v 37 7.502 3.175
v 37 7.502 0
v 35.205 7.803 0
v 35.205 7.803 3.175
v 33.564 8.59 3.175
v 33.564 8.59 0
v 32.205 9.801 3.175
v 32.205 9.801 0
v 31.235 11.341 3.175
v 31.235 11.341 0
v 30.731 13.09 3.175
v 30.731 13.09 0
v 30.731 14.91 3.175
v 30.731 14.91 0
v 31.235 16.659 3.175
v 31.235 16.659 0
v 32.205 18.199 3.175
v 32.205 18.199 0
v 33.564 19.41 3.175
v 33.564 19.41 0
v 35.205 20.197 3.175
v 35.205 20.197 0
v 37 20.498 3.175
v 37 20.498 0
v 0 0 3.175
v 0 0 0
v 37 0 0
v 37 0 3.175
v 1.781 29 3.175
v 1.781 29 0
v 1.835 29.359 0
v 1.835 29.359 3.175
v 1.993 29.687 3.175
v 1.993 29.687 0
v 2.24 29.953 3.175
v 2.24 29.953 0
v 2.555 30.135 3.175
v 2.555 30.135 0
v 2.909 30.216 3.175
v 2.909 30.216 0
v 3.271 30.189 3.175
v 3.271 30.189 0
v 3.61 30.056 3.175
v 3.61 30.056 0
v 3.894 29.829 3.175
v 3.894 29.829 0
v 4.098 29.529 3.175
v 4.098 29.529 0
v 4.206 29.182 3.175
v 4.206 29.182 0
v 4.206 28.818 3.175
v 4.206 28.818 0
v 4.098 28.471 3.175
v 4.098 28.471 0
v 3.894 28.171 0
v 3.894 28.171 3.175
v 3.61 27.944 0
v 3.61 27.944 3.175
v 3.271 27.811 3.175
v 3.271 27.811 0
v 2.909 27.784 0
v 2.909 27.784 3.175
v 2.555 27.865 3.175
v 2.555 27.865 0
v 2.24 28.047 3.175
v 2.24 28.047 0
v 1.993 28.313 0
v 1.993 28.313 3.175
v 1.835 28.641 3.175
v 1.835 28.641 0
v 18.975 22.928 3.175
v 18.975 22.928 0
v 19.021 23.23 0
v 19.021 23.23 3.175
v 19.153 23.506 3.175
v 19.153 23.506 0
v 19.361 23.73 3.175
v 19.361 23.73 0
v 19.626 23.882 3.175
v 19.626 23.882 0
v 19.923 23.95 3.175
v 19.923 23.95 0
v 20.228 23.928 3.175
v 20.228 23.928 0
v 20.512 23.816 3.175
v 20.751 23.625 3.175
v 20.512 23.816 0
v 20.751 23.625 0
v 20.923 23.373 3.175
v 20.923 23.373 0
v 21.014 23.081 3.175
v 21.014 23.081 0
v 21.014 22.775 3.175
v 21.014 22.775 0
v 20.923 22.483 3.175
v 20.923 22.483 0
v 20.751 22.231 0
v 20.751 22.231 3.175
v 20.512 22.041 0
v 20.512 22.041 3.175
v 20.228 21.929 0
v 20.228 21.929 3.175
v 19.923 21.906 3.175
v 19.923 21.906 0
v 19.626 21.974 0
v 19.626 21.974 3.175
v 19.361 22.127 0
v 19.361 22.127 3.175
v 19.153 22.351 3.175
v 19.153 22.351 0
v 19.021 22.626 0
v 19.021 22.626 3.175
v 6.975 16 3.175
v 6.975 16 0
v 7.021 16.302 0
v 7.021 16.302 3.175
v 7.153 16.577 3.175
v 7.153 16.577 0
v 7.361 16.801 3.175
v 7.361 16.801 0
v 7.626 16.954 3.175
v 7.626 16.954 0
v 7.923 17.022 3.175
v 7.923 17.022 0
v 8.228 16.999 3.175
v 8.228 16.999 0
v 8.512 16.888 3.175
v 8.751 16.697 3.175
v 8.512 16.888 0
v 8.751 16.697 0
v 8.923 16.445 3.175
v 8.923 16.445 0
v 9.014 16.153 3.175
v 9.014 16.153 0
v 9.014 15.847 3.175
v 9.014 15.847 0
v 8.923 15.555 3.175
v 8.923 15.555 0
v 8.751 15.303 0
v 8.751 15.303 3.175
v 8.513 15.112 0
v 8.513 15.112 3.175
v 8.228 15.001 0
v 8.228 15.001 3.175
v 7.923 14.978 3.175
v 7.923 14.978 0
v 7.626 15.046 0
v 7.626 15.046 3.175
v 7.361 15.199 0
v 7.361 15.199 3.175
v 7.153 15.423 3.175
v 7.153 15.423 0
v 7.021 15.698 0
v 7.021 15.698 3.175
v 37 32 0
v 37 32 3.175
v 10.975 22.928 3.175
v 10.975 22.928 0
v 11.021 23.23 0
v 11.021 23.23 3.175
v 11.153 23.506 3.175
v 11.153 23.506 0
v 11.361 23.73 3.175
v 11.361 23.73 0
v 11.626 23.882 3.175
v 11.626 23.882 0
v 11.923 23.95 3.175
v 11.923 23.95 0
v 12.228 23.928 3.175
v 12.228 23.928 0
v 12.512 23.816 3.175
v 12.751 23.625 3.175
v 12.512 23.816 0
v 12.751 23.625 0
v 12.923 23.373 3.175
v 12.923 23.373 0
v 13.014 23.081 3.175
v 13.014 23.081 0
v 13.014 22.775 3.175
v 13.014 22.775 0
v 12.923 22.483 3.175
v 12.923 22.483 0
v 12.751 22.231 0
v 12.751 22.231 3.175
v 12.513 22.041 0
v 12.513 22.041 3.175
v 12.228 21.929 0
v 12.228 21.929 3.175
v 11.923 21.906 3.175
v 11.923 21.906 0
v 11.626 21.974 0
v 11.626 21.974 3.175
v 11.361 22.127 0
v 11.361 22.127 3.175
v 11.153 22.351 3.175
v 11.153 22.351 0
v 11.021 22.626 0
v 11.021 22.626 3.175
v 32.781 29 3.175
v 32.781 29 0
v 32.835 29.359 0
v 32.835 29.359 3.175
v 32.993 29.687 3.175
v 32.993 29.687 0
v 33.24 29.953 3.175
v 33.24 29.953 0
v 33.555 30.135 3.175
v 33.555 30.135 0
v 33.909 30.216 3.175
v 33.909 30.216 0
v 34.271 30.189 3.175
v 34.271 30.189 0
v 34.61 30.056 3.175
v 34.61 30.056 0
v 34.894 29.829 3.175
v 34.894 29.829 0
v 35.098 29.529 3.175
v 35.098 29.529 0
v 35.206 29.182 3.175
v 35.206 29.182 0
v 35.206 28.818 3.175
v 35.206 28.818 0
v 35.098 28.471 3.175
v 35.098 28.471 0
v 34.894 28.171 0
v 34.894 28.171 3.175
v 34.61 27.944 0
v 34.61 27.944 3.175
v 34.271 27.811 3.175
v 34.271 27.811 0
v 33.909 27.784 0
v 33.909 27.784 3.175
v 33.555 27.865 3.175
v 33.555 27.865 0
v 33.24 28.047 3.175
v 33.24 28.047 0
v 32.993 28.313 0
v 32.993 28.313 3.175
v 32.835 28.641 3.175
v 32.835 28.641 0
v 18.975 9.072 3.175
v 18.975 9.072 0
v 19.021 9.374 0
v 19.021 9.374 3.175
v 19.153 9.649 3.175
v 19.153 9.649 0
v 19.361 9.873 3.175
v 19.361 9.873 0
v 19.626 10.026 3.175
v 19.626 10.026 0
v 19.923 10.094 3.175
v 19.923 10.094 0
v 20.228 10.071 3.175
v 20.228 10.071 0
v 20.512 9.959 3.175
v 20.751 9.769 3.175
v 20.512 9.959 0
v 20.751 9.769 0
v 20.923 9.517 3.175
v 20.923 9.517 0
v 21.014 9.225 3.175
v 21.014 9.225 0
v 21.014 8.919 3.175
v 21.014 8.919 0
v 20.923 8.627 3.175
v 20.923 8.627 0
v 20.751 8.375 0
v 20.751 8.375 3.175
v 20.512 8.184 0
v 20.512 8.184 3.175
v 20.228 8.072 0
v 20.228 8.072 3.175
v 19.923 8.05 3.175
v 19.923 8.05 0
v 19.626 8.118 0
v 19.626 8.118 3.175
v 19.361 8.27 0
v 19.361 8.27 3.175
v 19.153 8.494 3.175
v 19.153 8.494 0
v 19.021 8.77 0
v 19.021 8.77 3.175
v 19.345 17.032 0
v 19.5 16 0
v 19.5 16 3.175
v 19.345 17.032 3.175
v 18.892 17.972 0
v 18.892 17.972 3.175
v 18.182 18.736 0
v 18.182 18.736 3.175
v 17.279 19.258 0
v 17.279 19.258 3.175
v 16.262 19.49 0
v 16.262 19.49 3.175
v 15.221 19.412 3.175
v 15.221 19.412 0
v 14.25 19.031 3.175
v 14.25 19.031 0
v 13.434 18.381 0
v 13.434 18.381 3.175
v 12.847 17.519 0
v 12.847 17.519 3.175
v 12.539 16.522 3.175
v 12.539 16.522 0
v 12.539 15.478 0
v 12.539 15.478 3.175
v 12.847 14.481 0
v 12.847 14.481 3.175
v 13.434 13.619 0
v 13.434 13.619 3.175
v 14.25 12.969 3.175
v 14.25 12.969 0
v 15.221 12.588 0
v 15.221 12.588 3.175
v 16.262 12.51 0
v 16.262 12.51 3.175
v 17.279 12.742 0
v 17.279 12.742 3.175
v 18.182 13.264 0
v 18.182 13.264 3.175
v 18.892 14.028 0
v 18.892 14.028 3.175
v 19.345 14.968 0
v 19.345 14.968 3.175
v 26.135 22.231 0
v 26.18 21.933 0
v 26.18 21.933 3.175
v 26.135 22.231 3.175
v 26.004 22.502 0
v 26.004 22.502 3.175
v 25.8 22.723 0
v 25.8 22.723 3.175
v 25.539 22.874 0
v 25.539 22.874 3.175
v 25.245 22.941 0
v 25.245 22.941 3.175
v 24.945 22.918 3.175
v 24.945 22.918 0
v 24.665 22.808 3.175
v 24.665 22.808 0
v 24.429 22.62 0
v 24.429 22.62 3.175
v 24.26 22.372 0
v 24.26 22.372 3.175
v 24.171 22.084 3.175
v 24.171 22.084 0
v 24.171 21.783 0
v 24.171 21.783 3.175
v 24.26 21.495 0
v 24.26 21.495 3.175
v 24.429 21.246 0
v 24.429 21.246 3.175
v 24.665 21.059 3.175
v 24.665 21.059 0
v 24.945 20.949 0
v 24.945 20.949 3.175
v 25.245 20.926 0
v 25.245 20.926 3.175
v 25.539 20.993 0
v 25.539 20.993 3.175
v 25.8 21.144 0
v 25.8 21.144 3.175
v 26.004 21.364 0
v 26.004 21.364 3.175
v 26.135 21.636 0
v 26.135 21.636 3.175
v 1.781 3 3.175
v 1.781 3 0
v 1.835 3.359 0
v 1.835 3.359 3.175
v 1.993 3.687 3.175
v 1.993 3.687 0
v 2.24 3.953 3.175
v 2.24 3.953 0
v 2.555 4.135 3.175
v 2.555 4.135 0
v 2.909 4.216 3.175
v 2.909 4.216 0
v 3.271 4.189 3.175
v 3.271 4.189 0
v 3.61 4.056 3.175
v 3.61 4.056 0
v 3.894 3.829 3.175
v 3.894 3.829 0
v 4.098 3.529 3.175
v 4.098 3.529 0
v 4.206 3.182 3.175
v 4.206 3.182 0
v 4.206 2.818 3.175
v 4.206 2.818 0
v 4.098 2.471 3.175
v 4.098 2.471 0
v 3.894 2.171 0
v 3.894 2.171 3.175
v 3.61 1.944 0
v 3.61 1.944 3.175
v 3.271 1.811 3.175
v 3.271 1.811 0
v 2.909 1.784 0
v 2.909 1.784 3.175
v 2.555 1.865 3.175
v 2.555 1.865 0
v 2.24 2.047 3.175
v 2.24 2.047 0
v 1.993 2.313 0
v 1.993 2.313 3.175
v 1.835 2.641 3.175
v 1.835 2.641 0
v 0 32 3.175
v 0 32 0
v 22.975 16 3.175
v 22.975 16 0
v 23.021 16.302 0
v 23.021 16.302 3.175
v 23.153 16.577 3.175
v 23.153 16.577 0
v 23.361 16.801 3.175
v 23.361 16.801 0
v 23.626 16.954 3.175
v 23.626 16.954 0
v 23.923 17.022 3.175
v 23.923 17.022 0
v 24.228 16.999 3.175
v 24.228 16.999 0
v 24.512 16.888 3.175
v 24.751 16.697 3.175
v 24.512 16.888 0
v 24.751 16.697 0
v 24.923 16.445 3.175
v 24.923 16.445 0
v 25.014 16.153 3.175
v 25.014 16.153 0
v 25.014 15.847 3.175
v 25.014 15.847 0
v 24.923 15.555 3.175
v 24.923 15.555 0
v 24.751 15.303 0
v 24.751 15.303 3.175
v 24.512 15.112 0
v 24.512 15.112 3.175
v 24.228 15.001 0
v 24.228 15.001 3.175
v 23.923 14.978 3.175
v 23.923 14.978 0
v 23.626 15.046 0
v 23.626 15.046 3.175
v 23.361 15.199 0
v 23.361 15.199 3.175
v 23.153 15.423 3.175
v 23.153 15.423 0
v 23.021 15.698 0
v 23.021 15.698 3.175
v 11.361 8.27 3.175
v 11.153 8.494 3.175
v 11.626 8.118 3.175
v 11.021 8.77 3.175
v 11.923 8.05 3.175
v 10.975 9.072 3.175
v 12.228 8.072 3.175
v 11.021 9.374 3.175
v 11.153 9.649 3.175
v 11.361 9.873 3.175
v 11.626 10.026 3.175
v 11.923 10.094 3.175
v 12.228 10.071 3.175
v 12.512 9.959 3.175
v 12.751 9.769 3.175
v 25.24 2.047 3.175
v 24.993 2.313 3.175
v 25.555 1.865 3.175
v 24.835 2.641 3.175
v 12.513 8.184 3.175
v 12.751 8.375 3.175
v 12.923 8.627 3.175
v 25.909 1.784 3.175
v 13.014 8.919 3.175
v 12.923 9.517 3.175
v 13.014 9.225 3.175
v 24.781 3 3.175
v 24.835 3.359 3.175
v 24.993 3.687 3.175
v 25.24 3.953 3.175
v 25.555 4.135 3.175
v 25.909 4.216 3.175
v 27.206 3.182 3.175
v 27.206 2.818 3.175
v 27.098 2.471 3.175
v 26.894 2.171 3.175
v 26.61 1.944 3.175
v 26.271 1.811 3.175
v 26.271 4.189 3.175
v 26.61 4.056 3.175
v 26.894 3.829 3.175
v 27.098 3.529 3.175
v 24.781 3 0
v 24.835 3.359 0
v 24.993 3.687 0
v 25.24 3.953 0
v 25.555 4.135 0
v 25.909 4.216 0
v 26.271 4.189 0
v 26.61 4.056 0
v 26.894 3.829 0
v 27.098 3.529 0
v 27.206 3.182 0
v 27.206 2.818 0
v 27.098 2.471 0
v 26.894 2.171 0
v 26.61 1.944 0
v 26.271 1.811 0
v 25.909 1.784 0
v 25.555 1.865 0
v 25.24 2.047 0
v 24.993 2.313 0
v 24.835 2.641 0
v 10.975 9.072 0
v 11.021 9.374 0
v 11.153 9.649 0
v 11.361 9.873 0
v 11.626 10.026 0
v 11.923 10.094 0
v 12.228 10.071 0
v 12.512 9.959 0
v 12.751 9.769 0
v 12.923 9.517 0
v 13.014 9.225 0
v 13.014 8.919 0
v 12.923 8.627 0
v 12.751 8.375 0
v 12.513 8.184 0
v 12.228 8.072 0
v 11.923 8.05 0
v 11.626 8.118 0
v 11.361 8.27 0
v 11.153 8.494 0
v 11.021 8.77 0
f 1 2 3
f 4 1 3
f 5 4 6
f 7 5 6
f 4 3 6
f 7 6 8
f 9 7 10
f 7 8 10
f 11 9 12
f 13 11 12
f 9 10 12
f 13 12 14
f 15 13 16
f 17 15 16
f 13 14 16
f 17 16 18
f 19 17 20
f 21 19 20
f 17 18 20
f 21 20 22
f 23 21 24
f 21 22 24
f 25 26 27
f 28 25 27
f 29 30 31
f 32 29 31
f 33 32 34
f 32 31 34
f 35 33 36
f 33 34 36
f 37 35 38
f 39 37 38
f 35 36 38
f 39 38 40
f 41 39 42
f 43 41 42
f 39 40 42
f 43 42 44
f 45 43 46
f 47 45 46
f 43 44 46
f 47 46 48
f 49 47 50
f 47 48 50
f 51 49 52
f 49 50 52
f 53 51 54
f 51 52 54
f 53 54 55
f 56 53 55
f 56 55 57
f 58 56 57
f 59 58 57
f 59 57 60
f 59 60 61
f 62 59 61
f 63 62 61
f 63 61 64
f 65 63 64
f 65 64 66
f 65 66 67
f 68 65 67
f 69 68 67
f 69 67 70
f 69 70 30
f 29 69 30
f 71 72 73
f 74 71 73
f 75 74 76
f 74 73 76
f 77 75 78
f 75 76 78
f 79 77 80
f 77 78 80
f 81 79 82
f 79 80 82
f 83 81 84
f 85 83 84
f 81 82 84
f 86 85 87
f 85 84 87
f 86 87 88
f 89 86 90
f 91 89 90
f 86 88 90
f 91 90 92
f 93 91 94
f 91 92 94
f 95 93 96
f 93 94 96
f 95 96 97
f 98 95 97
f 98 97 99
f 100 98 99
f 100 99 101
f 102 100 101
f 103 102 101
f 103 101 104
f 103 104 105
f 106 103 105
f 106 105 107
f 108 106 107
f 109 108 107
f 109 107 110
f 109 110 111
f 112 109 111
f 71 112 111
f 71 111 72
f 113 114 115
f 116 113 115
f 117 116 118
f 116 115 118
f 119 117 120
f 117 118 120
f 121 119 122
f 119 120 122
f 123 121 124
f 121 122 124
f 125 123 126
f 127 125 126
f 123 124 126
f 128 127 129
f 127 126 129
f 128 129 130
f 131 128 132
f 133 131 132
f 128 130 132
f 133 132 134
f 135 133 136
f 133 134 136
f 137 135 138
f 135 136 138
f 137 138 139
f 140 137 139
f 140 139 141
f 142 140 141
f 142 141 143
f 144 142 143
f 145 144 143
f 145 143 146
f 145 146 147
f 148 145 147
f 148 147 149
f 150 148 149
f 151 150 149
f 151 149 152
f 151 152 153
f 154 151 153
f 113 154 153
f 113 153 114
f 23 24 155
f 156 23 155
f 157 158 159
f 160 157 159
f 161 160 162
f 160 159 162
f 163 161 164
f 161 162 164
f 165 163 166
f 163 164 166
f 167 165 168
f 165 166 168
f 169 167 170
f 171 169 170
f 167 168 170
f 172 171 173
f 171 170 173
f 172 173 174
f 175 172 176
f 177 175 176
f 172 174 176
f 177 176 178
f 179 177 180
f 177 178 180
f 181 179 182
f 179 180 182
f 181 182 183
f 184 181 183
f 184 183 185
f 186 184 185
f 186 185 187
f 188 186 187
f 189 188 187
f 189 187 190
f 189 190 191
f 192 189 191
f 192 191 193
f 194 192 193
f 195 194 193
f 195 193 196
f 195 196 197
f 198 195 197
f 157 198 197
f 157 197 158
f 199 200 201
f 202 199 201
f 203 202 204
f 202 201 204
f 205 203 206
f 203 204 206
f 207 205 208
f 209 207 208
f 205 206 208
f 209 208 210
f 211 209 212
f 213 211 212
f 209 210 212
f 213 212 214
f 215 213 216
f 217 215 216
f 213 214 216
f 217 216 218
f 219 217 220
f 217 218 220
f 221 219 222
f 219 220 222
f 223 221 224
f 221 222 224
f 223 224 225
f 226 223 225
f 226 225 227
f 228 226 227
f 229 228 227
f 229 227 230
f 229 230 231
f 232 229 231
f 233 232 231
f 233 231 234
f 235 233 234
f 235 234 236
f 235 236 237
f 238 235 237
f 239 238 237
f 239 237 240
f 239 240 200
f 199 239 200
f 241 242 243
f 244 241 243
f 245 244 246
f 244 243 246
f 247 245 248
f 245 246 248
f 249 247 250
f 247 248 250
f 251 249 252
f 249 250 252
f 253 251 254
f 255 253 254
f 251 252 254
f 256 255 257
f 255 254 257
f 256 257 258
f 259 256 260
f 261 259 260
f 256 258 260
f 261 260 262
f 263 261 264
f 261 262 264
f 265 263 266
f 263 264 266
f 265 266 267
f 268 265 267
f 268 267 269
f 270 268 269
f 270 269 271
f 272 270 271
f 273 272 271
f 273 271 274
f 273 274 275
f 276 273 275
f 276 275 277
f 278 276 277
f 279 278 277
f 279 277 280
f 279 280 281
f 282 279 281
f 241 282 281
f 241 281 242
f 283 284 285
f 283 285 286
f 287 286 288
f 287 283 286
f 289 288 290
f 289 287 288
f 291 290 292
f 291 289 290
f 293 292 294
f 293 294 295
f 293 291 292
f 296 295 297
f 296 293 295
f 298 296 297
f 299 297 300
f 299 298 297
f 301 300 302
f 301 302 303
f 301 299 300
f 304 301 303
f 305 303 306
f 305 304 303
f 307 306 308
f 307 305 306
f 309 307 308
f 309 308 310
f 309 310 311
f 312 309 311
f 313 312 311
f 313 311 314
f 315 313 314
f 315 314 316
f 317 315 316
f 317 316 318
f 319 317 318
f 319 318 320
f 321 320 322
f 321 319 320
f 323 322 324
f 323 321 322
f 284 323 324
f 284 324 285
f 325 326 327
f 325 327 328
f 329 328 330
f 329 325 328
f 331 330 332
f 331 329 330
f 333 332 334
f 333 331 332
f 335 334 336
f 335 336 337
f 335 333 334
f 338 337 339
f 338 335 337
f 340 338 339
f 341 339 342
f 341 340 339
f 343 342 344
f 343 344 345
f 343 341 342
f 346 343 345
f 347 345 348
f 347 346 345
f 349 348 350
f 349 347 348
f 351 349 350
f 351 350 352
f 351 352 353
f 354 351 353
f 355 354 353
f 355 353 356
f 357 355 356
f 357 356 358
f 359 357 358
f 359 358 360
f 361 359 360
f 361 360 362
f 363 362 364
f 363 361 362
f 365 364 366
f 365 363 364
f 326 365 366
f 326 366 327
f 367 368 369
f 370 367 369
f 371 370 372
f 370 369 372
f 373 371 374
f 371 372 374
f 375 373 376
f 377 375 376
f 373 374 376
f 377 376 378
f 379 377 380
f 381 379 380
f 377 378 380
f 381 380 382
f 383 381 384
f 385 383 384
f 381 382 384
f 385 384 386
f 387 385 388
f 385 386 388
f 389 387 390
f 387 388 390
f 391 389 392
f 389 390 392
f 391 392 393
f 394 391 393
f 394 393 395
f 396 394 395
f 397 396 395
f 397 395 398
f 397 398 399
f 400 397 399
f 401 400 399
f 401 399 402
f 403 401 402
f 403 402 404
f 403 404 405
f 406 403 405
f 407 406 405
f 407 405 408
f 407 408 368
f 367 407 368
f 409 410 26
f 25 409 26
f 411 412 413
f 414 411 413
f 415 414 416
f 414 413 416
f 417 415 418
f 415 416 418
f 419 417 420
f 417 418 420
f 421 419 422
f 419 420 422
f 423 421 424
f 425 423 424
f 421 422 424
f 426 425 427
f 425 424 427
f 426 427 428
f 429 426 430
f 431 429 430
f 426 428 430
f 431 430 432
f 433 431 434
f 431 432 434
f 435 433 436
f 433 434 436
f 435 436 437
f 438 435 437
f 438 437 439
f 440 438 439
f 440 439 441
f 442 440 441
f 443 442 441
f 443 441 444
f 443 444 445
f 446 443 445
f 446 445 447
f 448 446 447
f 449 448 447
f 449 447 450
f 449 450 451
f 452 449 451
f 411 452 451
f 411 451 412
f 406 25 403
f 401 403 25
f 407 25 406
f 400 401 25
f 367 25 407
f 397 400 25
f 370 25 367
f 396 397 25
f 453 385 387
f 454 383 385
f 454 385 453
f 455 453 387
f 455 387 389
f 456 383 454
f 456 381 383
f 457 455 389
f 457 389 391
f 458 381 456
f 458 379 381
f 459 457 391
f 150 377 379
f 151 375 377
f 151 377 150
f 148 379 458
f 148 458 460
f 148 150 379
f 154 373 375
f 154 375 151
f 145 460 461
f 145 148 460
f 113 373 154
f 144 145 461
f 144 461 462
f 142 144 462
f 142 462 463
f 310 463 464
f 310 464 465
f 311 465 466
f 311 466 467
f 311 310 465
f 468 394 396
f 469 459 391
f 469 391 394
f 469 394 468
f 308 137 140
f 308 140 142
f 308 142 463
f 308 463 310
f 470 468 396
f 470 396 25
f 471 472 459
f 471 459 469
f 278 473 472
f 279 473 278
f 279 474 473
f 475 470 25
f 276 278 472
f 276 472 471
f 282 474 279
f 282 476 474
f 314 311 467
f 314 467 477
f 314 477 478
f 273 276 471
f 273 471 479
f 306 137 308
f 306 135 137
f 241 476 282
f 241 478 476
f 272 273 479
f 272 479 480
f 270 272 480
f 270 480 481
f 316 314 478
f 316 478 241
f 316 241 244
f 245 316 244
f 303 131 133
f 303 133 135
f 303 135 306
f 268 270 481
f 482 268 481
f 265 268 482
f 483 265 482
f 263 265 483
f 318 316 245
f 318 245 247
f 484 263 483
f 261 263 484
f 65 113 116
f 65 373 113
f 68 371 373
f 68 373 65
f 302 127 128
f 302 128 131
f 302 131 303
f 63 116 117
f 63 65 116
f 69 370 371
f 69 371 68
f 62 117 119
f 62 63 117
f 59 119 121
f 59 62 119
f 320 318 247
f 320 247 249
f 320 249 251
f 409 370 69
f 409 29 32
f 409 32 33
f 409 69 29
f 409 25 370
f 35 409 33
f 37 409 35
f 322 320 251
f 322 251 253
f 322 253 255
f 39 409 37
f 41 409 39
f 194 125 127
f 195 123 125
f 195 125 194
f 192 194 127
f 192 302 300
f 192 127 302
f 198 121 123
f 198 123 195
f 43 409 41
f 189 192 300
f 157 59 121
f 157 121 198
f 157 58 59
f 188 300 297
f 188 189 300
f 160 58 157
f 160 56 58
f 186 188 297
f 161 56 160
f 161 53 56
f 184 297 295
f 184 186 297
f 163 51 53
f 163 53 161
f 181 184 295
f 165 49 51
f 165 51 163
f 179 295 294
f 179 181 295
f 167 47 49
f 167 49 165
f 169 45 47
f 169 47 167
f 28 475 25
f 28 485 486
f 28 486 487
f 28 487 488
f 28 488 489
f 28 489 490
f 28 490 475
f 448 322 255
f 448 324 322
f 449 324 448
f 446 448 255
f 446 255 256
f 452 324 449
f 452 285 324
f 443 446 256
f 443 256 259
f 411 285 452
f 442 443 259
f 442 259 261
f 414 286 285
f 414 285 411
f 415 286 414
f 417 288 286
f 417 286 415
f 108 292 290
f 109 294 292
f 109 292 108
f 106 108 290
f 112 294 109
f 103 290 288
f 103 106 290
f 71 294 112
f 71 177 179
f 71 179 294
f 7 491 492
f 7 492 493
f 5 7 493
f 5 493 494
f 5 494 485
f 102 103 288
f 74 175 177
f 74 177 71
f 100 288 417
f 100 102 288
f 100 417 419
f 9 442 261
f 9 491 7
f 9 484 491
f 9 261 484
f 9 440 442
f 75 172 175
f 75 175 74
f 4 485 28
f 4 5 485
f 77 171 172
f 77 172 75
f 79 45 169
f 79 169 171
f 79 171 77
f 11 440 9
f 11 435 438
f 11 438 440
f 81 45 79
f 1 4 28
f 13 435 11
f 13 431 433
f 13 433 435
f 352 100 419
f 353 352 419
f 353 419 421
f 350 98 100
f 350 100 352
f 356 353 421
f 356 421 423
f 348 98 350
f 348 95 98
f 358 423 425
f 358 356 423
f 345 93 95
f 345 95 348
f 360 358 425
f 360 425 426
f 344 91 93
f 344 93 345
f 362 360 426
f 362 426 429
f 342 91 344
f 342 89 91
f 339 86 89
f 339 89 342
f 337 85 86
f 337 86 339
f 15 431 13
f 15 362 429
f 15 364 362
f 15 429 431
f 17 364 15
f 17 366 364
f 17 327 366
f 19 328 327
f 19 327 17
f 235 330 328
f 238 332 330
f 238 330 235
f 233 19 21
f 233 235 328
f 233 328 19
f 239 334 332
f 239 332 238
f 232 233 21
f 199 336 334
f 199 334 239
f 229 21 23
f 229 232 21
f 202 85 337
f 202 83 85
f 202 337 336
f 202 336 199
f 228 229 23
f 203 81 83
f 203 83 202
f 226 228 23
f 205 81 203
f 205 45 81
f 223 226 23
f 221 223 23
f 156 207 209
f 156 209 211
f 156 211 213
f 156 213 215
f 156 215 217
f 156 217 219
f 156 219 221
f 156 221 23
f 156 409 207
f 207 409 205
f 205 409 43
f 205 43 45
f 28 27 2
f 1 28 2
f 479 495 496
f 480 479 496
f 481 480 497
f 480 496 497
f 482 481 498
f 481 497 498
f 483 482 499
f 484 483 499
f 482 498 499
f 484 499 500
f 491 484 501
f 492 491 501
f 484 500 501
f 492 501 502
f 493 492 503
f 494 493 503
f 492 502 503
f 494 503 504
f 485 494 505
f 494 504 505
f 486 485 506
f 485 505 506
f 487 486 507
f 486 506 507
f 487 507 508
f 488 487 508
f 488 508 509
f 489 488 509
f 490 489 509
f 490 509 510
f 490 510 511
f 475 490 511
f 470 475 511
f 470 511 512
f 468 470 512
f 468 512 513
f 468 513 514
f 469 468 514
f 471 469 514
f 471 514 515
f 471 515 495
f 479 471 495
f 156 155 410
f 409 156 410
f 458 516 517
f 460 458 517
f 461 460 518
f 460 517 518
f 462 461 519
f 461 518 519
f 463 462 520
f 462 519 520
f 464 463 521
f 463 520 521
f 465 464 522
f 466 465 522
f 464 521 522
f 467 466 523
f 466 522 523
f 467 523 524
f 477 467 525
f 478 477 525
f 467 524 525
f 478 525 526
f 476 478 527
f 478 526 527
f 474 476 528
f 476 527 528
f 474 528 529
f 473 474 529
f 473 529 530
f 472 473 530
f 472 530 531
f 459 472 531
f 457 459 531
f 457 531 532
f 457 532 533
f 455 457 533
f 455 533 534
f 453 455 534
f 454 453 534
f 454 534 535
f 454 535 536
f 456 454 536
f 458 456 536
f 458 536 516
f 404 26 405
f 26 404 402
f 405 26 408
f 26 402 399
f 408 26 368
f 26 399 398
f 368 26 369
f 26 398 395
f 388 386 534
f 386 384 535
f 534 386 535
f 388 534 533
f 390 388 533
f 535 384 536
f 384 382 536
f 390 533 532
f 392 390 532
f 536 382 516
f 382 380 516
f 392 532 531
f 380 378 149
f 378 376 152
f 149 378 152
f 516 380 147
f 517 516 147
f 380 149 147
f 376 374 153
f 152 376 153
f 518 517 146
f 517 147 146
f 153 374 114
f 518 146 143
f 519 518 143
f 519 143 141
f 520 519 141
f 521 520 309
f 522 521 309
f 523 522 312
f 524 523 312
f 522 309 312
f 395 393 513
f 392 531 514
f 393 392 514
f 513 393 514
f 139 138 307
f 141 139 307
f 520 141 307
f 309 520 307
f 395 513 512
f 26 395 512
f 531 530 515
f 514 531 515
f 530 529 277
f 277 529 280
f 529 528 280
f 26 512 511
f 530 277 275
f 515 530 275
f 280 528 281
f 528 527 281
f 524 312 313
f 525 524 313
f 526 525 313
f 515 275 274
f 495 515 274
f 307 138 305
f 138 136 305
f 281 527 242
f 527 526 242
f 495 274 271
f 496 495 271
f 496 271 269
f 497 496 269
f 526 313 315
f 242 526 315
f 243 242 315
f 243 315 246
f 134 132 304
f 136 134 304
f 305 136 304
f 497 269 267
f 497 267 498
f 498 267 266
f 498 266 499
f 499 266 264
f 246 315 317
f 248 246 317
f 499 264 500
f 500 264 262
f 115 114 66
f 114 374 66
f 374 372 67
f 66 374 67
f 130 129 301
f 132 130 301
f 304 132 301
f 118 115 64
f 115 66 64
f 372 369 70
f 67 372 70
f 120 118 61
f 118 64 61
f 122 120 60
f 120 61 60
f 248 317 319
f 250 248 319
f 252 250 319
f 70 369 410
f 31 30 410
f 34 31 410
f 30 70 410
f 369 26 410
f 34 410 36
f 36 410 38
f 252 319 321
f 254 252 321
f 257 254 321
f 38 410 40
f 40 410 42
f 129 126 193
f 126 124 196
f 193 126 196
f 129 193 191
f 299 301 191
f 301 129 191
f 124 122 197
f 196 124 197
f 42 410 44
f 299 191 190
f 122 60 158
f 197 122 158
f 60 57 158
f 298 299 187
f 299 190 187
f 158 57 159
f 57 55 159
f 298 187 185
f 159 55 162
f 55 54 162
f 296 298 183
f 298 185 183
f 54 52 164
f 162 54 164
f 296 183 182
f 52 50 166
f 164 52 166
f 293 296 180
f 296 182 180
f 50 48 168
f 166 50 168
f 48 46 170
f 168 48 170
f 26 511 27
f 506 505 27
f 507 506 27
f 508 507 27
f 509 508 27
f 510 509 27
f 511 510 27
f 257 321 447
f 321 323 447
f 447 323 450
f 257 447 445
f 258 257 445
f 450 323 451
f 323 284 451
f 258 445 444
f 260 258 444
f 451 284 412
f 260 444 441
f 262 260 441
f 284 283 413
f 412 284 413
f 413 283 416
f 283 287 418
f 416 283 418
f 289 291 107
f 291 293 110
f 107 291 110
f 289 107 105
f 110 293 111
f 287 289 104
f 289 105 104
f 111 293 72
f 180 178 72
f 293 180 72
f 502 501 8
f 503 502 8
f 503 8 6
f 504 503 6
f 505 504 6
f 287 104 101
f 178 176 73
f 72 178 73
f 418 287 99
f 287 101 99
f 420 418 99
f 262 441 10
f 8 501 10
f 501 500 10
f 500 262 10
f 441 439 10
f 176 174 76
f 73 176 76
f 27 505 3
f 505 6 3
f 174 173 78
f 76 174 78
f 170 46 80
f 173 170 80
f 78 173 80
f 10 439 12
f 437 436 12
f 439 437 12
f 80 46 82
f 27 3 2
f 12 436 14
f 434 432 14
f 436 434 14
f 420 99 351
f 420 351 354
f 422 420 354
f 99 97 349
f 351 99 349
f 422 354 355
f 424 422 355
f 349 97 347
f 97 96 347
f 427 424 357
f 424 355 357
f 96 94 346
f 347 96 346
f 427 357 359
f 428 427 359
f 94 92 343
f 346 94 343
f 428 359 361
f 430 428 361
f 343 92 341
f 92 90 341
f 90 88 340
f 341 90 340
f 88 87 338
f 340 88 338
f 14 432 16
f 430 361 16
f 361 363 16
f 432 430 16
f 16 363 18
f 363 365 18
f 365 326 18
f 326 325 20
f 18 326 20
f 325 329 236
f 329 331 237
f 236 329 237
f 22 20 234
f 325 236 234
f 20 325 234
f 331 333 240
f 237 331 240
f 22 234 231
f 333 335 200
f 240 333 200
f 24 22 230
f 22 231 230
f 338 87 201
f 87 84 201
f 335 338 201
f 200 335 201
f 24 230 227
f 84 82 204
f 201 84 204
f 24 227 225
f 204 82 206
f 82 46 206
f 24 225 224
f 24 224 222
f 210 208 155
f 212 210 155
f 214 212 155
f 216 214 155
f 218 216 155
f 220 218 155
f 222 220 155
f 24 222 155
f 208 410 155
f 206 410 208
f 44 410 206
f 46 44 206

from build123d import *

# Parameters (mm, degrees)
SKETCH1_R                 = 1.01
SKETCH1_R_2               = 3.5
BOSS_EXTRUDE2_DEPTH       = 3.175
F_2_CLEARANCE_HOLE1_D     = 2.4384
F_2_CLEARANCE_HOLE1_DEPTH = 3.302
F_2_CLEARANCE_HOLE1_TIP   = 0.732569267
M2_5X0_45_TAPPED_HOLE1_D  = 2.05


with BuildPart() as part:
    # Sketch1 → Boss-Extrude2 (new body)
    with BuildSketch(Plane.XY):
        with BuildLine():
            Line((0, 0), (37, 0))
            Line((37, 0), (37, 7.50213794))
            ThreePointArc((37, 7.50213794), (30.666699296, 14), (37, 20.49786206))
            Line((37, 20.49786206), (37, 32))
            Line((37, 32), (0, 32))
            Line((0, 32), (0, 0))
        make_face()
        with Locations((25.169778966, 21.933400182)):
            Circle(SKETCH1_R, mode=Mode.SUBTRACT)
        with Locations((16, 16)):
            Circle(SKETCH1_R_2, mode=Mode.SUBTRACT)
    extrude(amount=BOSS_EXTRUDE2_DEPTH)

    # #2 Clearance Hole1
    with Locations(Plane.XY.offset(3.175)):
        with Locations((3, 29), (3, 3), (34, 29), (26, 3)):
            Hole(F_2_CLEARANCE_HOLE1_D / 2, depth=F_2_CLEARANCE_HOLE1_DEPTH)
            with Locations((0, 0, -(F_2_CLEARANCE_HOLE1_DEPTH + F_2_CLEARANCE_HOLE1_TIP / 2))):  # 118° drill point
                Cone(0, F_2_CLEARANCE_HOLE1_D / 2, F_2_CLEARANCE_HOLE1_TIP, mode=Mode.SUBTRACT)

    # M2.5x0.45 Tapped Hole1 (through all)
    with Locations(Plane.XY.offset(3.175)):
        with Locations((8, 16), (12, 22.92820323), (20, 22.92820323), (24, 16), (20, 9.07179677), (12, 9.07179677), (16, 16)):
            Hole(M2_5X0_45_TAPPED_HOLE1_D / 2)


solid = part.part
